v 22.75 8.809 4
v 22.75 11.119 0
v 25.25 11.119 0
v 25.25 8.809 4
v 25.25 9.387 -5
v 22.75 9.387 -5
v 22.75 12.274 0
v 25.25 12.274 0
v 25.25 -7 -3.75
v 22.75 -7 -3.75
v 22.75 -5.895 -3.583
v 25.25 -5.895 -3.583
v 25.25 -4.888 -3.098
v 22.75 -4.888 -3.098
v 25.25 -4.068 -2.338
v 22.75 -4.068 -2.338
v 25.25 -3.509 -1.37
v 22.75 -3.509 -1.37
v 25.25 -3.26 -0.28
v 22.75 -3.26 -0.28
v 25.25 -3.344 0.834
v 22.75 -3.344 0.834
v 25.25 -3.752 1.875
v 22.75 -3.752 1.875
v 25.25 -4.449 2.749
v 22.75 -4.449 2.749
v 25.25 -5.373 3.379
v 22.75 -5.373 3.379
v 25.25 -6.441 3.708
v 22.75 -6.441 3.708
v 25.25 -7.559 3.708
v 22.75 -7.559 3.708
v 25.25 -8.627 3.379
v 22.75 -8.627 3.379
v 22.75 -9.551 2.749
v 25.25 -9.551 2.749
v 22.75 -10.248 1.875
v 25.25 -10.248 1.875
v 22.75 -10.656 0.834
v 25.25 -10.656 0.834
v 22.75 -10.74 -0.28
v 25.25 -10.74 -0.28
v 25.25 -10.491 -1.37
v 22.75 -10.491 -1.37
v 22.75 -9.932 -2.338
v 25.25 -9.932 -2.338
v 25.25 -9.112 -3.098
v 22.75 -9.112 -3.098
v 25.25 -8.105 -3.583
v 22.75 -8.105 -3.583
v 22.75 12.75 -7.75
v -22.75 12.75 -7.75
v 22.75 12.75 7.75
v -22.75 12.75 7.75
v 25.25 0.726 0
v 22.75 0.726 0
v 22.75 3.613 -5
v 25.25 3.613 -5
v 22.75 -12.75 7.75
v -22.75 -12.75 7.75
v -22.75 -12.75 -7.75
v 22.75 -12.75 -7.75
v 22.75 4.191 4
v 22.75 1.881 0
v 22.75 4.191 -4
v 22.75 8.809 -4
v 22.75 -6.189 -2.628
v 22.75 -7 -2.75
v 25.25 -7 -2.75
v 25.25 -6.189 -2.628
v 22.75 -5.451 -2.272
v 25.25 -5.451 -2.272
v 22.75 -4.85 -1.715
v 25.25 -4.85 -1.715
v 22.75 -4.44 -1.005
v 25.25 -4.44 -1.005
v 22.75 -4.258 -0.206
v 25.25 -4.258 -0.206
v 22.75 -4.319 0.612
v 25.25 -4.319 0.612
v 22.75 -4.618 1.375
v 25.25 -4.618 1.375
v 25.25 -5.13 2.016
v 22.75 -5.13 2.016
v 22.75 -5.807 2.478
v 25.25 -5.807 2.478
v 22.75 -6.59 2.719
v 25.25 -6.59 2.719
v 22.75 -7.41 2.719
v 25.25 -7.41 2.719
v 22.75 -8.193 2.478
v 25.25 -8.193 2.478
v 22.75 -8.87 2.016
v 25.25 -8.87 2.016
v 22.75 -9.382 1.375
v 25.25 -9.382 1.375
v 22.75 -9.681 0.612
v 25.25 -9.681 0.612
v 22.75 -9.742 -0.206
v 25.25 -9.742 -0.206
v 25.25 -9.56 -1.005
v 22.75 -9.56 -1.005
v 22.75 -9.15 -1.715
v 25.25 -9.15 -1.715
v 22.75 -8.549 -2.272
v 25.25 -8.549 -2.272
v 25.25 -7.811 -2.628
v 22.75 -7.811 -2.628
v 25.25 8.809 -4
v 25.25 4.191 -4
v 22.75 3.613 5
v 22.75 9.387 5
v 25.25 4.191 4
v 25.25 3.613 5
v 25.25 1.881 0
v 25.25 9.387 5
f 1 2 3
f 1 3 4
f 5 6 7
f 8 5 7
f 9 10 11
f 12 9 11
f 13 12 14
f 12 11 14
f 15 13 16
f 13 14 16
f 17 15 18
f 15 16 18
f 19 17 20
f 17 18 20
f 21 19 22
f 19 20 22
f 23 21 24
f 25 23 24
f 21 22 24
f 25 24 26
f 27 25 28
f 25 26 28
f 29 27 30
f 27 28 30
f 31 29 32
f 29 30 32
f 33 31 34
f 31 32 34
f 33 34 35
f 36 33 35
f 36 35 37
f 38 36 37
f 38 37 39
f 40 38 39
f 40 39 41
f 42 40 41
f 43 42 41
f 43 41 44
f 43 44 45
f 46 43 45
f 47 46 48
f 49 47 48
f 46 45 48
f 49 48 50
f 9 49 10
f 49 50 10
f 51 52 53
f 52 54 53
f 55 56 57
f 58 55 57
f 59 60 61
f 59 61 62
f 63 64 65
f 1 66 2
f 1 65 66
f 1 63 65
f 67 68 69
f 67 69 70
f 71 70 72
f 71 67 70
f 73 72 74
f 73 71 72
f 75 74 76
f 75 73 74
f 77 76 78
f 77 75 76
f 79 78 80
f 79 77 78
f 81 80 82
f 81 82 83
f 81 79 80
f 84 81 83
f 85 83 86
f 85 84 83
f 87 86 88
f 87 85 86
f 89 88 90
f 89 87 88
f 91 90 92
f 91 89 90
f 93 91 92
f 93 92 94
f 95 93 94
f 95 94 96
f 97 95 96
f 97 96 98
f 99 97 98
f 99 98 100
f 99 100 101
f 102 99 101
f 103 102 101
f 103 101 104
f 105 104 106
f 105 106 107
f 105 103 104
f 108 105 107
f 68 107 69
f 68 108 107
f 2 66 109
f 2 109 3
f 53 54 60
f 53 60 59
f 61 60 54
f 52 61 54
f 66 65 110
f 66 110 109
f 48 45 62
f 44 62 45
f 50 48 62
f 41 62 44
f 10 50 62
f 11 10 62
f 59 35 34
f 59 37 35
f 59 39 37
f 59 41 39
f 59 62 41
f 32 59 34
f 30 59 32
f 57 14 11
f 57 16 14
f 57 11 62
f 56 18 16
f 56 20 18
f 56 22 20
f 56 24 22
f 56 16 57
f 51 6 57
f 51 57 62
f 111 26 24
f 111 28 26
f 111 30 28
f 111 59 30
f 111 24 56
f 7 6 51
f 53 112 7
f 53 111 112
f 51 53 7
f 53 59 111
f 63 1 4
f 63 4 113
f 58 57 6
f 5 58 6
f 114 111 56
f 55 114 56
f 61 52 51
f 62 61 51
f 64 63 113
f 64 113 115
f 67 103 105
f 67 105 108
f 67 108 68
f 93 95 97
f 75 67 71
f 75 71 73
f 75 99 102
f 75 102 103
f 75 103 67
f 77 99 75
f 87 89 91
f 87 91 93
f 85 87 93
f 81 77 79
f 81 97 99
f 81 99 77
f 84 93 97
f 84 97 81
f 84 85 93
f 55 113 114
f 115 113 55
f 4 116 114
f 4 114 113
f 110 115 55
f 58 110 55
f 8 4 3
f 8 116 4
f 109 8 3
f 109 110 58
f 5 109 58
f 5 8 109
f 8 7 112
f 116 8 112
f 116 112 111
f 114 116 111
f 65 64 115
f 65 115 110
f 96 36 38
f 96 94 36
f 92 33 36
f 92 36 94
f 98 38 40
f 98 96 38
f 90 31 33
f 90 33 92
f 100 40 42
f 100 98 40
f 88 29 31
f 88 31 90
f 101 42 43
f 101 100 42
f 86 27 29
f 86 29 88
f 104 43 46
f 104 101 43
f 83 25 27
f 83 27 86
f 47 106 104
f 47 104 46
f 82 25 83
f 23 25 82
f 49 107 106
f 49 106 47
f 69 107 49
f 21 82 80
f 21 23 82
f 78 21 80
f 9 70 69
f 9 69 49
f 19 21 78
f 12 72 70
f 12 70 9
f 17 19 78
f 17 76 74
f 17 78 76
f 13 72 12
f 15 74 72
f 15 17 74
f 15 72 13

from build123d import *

# Parameters (mm, degrees)
CROQUIS1_W              = 45.5
CROQUIS1_H              = 25.5
SALIENTE_EXTRUIR1_DEPTH = 7.75
CROQUIS2_R              = 3.75
CROQUIS2_R_2            = 2.75
EXTRUIR_L_MINA1_DEPTH   = 2.5


with BuildPart() as part:
    # Croquis1 → Saliente-Extruir1 (new body, symmetric)
    with BuildSketch(Plane.XY):
        Rectangle(CROQUIS1_W, CROQUIS1_H)
    extrude(amount=SALIENTE_EXTRUIR1_DEPTH, both=True)

    # Croquis2 → Extruir-Lámina1 (add)
    with BuildSketch(Plane(origin=(22.75, 0, 0), x_dir=(0, 0, -1), z_dir=(1, 0, 0))):
        with Locations((0, -7)):
            Circle(CROQUIS2_R)
        with Locations((0, -7)):
            Circle(CROQUIS2_R_2, mode=Mode.SUBTRACT)
        Polygon((0, 12.273502692), (-5, 9.386751346), (-5, 3.613248654), (0, 0.726497308), (5, 3.613248654), (5, 9.386751346), align=None)
        Polygon((0, 11.118802154), (-4, 8.809401077), (-4, 4.190598923), (0, 1.881197846), (4, 4.190598923), (4, 8.809401077), align=None, mode=Mode.SUBTRACT)
    extrude(amount=EXTRUIR_L_MINA1_DEPTH)


solid = part.part
